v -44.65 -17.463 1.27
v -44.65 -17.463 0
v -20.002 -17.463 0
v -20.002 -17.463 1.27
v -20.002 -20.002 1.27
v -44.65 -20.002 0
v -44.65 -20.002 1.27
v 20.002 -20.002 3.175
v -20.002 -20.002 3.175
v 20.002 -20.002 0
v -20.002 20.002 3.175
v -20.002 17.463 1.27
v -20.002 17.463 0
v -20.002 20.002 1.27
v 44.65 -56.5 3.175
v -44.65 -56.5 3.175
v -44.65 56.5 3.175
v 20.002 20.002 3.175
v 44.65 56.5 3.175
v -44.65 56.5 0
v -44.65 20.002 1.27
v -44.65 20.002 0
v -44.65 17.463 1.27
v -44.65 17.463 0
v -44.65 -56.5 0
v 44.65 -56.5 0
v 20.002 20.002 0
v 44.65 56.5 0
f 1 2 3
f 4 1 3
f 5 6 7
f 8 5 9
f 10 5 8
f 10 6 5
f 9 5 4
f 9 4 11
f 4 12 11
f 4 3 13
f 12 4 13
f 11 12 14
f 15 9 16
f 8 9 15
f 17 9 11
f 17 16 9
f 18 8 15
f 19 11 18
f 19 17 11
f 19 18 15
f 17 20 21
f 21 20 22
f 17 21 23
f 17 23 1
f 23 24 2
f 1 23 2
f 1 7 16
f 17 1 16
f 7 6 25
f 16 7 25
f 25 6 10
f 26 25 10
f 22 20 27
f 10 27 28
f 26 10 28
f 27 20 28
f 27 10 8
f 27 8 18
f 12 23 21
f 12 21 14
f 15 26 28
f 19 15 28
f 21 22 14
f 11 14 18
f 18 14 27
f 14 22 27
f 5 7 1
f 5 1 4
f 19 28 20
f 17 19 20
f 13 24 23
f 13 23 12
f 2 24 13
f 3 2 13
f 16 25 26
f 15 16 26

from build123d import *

# Parameters (mm, degrees)
F0_W     = 40.005
F0_H     = 40.005
F1_DEPTH = 3.175
F2_W     = 24.6475
F2_H     = 2.54
F3_DEPTH = 1.27


with BuildPart() as f1:
    # F0 (on Top) → F1 (new body)
    with BuildSketch(Plane.XY):
        Polygon((-44.65, -20.0025), (-44.65, -56.5), (44.65, -56.5), (44.65, 56.5), (-44.65, 56.5), (-44.65, 20.0025), (-44.65, 17.4625), (-44.65, -17.4625), align=None)
        Rectangle(F0_W, F0_H, mode=Mode.SUBTRACT)
    extrude(amount=F1_DEPTH)

    # F2 (on face) → F3 (cut)
    with BuildSketch(Plane(origin=(0, 0, 0), x_dir=(1, 0, 0), z_dir=(0, 0, -1))):
        with Locations((-32.32625, 18.7325)):
            Rectangle(F2_W, F2_H)
        with Locations((-32.32625, -18.7325)):
            Rectangle(F2_W, F2_H)
    extrude(amount=-F3_DEPTH, mode=Mode.SUBTRACT)


solid = f1.part
